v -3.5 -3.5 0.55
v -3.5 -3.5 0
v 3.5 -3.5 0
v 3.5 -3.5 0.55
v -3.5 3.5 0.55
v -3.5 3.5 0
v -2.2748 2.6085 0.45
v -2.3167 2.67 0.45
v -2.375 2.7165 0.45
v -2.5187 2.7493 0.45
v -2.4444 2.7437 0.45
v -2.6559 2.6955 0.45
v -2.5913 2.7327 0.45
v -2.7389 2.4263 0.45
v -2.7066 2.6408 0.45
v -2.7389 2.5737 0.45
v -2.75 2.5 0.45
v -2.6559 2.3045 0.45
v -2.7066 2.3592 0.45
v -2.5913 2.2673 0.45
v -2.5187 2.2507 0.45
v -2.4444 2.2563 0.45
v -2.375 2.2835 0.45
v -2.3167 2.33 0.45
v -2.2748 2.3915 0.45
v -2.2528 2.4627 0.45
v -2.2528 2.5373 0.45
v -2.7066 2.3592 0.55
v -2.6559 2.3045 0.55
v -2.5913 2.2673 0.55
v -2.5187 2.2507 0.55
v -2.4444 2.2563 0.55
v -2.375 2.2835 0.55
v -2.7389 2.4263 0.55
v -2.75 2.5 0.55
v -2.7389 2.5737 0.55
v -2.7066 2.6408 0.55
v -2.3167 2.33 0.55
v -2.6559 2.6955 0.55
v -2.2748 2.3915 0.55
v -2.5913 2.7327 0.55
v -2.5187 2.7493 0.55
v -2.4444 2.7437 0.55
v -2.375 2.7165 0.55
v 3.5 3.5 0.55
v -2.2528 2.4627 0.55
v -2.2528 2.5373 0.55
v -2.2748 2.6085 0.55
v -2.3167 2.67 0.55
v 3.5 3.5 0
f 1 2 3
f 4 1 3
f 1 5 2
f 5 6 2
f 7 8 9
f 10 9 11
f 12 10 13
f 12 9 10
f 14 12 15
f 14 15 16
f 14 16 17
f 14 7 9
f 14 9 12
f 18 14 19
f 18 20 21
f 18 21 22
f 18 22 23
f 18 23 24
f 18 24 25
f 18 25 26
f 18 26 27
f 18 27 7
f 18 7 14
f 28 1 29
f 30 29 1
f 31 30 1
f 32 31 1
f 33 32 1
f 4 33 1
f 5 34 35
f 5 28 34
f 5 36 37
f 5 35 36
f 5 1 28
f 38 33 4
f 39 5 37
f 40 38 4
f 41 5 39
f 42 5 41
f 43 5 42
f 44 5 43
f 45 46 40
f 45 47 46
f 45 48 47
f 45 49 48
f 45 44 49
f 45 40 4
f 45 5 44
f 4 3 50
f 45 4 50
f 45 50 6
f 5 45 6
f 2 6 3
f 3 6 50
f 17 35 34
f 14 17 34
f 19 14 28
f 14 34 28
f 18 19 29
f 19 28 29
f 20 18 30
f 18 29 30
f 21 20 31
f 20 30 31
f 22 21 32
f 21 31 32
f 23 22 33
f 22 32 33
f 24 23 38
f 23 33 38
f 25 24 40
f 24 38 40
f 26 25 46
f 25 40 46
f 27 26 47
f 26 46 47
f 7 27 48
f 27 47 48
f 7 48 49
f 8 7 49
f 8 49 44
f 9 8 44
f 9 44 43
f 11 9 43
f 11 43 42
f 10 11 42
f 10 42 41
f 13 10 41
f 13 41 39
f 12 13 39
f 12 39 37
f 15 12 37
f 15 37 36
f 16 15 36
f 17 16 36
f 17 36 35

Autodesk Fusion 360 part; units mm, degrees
sketch "スケッチ1" plane through (0, 0, 0) normal (0, 0, 1) x (1, 0, 0)
  line L0 (3.5, 3.5) -> (-3.5, 3.5)
  line L1 (-3.5, 3.5) -> (-3.5, -3.5)
  line L2 (-3.5, -3.5) -> (3.5, -3.5)
  line L3 (3.5, -3.5) -> (3.5, 3.5)
  line L4 (3.5, 3.5) -> (-3.5, -3.5) construction
  line L5 (-3.5, 3.5) -> (3.5, -3.5) construction
  dimension "d1" = 7
  dimension "d2" = 7
extrude "押し出し1" add sketch "スケッチ1" along normal blind 0.55
sketch "スケッチ2" plane through (0, 0, 0.55) normal (0, 0, 1) x (-1, 0, 0)
  line L0 (-3.5, 3.5) -> (-3.5, -3.5)
  line L1 (-3.5, -3.5) -> (3.5, -3.5)
  line L2 (3.5, -3.5) -> (3.5, 3.5)
  line L3 (3.5, 3.5) -> (-3.5, 3.5)
  circle A0 centre (2.5, -2.5) radius 0.25
  dimension "d5" = 0.5
extrude "押し出し2" cut sketch "スケッチ2" against normal blind 0.1 contours A0
